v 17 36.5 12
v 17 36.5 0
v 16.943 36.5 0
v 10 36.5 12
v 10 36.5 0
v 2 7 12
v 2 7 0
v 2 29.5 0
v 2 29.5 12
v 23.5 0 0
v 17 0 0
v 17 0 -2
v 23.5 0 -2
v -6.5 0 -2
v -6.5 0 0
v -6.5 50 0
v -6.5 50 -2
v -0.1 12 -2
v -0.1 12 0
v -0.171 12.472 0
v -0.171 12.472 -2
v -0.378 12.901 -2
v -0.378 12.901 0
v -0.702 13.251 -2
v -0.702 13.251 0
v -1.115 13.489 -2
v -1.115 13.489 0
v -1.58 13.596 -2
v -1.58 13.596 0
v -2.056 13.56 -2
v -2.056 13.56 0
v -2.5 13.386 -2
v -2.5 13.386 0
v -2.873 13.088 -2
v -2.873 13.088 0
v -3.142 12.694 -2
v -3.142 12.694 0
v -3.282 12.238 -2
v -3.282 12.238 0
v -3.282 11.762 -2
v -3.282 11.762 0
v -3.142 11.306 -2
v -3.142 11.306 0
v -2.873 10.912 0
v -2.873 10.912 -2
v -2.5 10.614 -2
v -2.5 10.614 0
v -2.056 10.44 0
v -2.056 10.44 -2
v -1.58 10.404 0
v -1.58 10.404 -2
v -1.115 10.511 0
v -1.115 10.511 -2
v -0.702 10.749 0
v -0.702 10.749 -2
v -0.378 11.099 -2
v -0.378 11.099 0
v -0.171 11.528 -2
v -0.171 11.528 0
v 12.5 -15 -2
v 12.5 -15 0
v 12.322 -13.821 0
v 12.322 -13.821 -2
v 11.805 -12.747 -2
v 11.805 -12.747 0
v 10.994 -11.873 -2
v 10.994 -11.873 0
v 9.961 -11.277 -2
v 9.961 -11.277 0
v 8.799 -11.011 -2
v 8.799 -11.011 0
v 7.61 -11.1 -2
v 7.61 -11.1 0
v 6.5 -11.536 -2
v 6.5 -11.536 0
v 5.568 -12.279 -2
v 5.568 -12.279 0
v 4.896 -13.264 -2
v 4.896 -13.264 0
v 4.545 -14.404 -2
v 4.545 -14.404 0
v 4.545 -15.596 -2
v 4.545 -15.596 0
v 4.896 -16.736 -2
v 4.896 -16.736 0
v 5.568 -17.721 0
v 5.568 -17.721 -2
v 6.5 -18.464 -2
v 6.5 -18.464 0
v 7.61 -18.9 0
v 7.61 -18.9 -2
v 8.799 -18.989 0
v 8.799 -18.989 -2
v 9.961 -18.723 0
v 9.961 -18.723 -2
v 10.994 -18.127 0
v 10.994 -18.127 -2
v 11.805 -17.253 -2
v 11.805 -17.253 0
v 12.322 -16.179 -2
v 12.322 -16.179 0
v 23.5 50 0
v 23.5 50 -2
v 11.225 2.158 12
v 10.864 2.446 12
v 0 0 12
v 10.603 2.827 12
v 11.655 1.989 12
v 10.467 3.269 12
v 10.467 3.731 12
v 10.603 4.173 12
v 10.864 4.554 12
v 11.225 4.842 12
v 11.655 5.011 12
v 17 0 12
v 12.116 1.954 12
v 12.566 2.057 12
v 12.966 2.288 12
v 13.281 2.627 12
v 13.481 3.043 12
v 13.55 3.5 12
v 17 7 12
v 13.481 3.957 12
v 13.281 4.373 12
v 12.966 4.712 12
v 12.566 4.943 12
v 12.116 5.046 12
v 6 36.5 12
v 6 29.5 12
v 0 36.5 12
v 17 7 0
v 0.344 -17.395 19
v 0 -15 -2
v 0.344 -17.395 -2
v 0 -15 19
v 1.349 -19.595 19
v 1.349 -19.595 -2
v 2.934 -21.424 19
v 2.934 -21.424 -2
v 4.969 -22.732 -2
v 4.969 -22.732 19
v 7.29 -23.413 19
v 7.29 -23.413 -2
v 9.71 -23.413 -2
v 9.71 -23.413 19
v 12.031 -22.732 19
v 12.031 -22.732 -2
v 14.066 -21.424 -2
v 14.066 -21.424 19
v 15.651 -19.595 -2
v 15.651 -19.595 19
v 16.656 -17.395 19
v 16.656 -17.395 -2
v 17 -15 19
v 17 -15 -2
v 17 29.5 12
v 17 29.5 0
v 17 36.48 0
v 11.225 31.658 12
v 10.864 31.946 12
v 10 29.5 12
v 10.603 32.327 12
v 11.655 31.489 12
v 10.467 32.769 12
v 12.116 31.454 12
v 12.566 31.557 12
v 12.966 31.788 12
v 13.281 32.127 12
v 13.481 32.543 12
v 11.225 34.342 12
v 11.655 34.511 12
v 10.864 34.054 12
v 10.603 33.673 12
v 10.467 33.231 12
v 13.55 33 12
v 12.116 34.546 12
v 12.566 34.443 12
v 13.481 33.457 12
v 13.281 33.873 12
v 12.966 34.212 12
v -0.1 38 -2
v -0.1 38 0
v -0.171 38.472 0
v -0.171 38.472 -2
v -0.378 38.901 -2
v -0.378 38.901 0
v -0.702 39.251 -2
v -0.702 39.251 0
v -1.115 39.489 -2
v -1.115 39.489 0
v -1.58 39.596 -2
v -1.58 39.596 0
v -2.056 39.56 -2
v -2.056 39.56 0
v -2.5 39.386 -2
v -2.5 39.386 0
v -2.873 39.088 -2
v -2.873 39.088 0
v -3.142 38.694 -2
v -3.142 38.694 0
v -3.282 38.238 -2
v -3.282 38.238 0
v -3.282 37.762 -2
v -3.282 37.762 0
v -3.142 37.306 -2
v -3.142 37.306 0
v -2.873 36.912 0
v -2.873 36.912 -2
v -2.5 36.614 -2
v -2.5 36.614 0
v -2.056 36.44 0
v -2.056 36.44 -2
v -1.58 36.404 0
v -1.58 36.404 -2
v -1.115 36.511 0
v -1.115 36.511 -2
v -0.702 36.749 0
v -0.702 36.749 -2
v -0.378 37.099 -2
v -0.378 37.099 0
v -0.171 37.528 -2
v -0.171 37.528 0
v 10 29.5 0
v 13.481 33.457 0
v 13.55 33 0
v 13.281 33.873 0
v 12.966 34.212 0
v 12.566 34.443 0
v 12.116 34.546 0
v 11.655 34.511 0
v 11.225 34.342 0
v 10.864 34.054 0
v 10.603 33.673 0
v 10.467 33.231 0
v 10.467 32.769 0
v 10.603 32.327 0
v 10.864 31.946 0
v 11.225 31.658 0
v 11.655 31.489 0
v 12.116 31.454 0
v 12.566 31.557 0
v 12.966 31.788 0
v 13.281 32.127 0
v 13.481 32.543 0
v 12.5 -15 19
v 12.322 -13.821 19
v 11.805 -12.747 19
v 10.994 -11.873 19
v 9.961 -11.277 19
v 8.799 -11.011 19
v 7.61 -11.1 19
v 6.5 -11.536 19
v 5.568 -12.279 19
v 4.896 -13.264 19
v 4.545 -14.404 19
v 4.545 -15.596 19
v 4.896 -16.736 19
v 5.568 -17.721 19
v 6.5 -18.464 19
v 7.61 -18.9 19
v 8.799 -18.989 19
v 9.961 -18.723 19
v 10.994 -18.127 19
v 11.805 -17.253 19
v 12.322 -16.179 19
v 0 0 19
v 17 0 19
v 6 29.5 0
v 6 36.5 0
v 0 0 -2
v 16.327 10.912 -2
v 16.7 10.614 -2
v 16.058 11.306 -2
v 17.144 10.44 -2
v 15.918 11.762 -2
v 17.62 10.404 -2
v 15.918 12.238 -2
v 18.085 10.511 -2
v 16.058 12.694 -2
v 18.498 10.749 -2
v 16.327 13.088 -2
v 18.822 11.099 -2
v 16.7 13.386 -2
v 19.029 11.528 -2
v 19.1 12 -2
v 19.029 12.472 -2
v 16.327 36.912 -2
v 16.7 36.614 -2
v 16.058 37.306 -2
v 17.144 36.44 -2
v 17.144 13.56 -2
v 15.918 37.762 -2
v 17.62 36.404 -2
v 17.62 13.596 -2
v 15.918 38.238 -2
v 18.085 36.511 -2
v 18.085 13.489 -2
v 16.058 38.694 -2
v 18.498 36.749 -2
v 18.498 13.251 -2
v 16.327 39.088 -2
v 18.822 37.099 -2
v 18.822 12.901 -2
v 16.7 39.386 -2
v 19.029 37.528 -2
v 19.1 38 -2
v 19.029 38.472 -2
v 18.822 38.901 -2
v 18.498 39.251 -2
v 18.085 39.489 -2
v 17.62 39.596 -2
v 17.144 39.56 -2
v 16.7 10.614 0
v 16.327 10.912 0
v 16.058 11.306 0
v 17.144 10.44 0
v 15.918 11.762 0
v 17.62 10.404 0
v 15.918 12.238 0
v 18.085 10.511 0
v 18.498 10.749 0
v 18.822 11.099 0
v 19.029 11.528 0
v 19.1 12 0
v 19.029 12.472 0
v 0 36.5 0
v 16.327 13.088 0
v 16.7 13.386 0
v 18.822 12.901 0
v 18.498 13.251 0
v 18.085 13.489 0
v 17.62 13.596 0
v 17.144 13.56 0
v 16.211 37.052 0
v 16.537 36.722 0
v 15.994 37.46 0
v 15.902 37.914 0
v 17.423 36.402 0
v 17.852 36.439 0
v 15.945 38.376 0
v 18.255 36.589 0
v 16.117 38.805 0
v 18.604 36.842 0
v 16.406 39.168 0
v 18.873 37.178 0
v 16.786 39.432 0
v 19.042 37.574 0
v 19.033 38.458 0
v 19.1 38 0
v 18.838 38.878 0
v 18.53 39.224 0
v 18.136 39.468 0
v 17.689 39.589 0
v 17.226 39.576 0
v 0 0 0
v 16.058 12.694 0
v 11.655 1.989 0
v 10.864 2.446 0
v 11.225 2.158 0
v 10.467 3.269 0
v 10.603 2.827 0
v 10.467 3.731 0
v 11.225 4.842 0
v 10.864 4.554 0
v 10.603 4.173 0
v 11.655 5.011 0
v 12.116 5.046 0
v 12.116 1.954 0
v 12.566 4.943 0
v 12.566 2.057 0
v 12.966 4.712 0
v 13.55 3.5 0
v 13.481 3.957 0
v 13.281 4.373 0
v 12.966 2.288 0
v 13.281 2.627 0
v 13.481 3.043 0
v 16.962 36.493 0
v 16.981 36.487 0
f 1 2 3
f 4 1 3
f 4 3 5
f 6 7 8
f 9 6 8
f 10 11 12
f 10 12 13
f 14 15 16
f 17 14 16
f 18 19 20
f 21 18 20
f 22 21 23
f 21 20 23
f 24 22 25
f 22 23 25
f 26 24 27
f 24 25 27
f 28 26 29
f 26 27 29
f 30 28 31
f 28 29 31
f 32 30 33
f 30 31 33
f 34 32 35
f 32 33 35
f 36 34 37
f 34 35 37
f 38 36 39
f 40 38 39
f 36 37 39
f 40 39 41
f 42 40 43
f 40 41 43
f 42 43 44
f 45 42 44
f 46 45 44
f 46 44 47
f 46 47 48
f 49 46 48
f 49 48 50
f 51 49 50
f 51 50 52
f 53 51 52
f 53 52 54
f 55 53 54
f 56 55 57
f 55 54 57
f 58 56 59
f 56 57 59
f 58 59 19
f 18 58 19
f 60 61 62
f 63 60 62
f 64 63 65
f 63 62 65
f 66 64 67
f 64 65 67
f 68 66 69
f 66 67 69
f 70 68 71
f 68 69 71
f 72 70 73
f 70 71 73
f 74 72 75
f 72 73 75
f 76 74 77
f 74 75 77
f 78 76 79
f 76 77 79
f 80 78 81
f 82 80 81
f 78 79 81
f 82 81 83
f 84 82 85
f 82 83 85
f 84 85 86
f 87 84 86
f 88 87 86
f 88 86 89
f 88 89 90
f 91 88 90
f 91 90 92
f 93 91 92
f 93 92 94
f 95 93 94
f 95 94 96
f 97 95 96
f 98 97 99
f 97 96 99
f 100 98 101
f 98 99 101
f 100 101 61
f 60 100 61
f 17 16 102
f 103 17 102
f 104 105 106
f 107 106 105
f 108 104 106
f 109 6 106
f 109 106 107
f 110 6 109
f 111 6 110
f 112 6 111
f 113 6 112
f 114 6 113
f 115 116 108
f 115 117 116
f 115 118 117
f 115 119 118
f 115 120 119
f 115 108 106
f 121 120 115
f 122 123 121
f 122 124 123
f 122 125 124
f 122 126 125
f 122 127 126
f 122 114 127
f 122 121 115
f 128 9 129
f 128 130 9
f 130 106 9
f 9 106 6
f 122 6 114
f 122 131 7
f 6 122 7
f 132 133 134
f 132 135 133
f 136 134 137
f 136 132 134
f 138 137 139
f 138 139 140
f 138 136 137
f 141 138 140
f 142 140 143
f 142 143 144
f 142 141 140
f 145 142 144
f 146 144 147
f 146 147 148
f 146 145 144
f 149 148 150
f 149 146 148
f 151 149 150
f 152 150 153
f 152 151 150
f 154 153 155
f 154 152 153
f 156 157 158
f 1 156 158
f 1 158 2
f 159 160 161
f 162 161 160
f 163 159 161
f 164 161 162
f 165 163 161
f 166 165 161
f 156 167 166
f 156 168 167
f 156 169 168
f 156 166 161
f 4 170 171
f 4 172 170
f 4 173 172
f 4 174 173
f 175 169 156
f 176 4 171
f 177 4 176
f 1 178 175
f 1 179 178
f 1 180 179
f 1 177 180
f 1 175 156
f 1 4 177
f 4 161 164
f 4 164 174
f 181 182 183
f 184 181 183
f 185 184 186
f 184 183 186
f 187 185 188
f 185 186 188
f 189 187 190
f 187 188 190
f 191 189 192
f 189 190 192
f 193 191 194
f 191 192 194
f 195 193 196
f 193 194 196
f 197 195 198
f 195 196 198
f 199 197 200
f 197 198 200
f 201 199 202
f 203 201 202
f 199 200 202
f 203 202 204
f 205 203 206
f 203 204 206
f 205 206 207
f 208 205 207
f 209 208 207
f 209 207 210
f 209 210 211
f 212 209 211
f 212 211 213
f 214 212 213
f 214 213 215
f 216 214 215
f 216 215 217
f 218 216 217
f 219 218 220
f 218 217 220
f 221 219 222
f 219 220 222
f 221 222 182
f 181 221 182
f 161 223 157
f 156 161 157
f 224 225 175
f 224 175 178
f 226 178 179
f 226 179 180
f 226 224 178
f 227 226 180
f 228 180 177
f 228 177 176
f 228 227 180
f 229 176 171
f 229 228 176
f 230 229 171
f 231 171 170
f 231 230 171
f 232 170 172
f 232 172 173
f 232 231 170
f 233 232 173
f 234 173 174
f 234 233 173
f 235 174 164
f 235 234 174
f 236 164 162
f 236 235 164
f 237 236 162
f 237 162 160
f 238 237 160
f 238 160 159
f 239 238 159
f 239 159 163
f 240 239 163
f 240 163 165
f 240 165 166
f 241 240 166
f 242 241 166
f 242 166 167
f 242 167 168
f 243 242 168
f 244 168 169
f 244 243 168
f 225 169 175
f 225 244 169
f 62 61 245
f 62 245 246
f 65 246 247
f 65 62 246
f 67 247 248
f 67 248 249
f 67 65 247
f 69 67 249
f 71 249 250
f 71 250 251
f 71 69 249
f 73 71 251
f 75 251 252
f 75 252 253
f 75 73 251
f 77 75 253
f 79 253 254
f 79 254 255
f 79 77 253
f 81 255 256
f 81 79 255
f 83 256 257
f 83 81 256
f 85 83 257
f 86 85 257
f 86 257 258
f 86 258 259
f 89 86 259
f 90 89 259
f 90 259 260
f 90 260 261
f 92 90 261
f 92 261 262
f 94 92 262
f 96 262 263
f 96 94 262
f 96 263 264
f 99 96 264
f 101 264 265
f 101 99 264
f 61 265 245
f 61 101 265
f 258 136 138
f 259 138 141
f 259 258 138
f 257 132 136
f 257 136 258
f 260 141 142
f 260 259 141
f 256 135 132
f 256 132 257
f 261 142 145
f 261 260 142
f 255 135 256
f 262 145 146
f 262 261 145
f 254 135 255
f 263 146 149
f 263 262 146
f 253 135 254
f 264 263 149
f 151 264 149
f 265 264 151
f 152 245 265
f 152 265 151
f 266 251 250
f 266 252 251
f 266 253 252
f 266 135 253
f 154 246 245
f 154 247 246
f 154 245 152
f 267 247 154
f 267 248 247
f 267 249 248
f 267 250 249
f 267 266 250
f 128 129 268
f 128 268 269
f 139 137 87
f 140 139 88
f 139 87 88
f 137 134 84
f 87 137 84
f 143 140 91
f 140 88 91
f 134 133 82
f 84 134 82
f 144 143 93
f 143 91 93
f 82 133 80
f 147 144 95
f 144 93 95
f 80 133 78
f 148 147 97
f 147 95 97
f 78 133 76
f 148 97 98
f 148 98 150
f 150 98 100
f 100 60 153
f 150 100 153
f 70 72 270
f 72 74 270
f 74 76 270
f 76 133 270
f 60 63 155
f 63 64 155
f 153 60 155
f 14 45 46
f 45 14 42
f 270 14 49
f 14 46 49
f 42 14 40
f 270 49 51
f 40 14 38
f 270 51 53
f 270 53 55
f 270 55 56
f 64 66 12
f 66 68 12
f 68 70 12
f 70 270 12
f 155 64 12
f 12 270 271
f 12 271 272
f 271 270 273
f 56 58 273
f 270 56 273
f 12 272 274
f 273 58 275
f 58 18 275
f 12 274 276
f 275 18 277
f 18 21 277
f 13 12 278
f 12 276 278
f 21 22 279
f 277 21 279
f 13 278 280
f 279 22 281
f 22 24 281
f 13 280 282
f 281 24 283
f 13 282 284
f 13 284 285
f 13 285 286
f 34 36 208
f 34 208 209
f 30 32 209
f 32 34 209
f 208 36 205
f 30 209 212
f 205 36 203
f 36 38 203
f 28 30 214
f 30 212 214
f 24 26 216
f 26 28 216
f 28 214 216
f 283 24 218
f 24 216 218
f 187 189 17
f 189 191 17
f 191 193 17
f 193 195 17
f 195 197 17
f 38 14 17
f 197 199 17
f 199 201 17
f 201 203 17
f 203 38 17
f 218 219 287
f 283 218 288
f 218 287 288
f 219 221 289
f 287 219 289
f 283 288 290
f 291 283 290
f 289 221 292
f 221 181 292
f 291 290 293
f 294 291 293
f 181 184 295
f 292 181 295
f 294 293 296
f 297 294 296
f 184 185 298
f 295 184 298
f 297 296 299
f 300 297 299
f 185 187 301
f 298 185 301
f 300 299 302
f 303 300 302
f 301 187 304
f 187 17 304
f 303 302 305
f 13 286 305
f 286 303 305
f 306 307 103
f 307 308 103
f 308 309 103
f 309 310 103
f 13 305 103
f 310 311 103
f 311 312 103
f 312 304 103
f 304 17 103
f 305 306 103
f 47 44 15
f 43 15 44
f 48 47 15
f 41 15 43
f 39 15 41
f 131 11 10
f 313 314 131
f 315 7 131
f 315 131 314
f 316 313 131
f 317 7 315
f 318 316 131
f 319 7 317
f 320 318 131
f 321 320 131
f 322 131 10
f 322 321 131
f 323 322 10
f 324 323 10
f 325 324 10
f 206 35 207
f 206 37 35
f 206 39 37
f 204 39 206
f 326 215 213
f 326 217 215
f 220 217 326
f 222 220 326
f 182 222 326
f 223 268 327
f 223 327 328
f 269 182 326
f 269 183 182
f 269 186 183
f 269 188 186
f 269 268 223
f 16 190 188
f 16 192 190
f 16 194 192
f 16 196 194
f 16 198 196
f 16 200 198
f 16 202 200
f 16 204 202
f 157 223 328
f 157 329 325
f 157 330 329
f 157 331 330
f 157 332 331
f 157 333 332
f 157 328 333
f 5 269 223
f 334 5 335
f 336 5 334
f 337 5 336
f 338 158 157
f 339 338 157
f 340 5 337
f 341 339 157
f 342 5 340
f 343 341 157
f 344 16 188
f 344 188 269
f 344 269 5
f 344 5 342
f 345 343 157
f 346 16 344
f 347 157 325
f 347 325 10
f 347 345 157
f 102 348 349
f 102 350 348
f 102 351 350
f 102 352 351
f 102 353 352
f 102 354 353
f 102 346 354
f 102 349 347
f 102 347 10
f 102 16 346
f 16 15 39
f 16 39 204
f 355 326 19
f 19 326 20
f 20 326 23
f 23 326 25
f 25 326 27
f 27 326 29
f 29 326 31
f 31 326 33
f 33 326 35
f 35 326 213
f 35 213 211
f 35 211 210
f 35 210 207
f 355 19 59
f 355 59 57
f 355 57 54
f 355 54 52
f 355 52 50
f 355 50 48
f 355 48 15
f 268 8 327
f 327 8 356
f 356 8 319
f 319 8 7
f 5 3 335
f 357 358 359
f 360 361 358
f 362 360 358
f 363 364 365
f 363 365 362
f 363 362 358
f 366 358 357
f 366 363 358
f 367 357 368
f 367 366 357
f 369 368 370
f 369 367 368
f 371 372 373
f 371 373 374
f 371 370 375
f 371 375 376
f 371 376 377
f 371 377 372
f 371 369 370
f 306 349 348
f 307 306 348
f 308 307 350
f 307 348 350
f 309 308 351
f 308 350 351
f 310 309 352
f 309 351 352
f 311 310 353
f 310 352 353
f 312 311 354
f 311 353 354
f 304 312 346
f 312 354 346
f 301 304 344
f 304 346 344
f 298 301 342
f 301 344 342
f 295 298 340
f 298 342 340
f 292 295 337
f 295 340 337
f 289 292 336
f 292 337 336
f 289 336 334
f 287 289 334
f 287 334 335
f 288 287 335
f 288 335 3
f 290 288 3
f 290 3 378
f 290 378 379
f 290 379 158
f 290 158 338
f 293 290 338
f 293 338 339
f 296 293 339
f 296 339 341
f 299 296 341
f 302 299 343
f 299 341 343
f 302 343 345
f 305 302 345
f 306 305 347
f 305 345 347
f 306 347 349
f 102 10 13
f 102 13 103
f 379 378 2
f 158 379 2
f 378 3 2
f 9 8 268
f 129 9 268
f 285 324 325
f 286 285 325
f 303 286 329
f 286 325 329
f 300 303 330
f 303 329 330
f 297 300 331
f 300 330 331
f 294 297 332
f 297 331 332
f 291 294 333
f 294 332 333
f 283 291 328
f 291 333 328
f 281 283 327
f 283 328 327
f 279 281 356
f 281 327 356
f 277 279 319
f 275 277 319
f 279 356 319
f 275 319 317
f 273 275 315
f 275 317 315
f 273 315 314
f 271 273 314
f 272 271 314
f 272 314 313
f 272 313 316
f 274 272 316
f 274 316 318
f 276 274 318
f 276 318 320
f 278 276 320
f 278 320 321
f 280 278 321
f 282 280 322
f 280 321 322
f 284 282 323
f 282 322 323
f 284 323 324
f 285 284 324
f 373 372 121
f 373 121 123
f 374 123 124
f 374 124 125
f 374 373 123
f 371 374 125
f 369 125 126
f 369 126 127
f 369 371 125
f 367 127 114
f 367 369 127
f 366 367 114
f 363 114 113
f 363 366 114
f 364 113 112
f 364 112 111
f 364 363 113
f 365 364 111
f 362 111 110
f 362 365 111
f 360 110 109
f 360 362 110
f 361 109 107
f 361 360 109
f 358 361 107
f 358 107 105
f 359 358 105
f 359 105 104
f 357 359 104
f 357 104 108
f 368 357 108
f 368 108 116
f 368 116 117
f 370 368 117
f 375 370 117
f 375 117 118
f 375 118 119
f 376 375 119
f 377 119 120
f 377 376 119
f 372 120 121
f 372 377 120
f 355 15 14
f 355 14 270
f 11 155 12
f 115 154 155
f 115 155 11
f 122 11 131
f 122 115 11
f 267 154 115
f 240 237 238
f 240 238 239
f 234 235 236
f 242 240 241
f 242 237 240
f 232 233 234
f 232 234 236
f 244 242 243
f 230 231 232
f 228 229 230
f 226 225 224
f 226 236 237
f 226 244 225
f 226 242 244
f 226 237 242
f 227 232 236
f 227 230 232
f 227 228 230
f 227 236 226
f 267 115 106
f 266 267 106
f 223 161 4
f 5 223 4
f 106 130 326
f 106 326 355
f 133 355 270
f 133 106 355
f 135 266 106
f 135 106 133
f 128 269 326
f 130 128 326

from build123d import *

# Parameters (mm, degrees)
SKETCH_R          = 1.55
PAD_DEPTH         = 12
SKETCH001_W       = 30
SKETCH001_H       = 50
SKETCH001_R       = 1.6
PAD001_DEPTH      = 2
SKETCH002_W       = 4
SKETCH002_H       = 7
POCKET_DEPTH      = 12
SKETCH004_R       = 4
PAD002_DEPTH      = 19
PAD002_DEPTH_BACK = 2


with BuildPart() as part:
    # Sketch → Pad (new body)
    with BuildSketch(Plane.XY):
        Polygon((0, 0), (17, 0), (17, 7), (2, 7), (2, 29.5), (17, 29.5), (17, 36.5), (0, 36.5), align=None)
        with Locations((12, 33)):
            Circle(SKETCH_R, mode=Mode.SUBTRACT)
        with Locations((12, 3.5)):
            Circle(SKETCH_R, mode=Mode.SUBTRACT)
    extrude(amount=PAD_DEPTH)

    # Sketch001 → Pad001 (join)
    with BuildSketch(Plane.XY):
        with Locations((8.5, 25)):
            Rectangle(SKETCH001_W, SKETCH001_H)
        with Locations((-1.7, 38)):
            Circle(SKETCH001_R, mode=Mode.SUBTRACT)
        with Locations((-1.7, 12)):
            Circle(SKETCH001_R, mode=Mode.SUBTRACT)
        with Locations((17.5, 12)):
            Circle(SKETCH001_R, mode=Mode.SUBTRACT)
        with Locations((17.5, 38)):
            Circle(SKETCH001_R, mode=Mode.SUBTRACT)
    extrude(amount=-PAD001_DEPTH)

    # Sketch002 (on DatumPlane) → Pocket (cut)
    with BuildSketch(Plane.XY.offset(12)):
        with Locations((8, 33)):
            Rectangle(SKETCH002_W, SKETCH002_H)
    extrude(amount=-POCKET_DEPTH, mode=Mode.SUBTRACT)

    # Sketch004 → Pad002 (join, two sides)
    with BuildSketch(Plane.XY) as pad002_sk:
        with BuildLine():
            ThreePointArc((0, -15), (8.5, -23.5), (17, -15))
            Line((17, -15), (17, 0))
            Line((17, 0), (0, 0))
            Line((0, 0), (0, -15))
        make_face()
        with Locations((8.5, -15)):
            Circle(SKETCH004_R, mode=Mode.SUBTRACT)
    extrude(amount=PAD002_DEPTH)
    extrude(pad002_sk.sketch, amount=-PAD002_DEPTH_BACK)


solid = part.part
